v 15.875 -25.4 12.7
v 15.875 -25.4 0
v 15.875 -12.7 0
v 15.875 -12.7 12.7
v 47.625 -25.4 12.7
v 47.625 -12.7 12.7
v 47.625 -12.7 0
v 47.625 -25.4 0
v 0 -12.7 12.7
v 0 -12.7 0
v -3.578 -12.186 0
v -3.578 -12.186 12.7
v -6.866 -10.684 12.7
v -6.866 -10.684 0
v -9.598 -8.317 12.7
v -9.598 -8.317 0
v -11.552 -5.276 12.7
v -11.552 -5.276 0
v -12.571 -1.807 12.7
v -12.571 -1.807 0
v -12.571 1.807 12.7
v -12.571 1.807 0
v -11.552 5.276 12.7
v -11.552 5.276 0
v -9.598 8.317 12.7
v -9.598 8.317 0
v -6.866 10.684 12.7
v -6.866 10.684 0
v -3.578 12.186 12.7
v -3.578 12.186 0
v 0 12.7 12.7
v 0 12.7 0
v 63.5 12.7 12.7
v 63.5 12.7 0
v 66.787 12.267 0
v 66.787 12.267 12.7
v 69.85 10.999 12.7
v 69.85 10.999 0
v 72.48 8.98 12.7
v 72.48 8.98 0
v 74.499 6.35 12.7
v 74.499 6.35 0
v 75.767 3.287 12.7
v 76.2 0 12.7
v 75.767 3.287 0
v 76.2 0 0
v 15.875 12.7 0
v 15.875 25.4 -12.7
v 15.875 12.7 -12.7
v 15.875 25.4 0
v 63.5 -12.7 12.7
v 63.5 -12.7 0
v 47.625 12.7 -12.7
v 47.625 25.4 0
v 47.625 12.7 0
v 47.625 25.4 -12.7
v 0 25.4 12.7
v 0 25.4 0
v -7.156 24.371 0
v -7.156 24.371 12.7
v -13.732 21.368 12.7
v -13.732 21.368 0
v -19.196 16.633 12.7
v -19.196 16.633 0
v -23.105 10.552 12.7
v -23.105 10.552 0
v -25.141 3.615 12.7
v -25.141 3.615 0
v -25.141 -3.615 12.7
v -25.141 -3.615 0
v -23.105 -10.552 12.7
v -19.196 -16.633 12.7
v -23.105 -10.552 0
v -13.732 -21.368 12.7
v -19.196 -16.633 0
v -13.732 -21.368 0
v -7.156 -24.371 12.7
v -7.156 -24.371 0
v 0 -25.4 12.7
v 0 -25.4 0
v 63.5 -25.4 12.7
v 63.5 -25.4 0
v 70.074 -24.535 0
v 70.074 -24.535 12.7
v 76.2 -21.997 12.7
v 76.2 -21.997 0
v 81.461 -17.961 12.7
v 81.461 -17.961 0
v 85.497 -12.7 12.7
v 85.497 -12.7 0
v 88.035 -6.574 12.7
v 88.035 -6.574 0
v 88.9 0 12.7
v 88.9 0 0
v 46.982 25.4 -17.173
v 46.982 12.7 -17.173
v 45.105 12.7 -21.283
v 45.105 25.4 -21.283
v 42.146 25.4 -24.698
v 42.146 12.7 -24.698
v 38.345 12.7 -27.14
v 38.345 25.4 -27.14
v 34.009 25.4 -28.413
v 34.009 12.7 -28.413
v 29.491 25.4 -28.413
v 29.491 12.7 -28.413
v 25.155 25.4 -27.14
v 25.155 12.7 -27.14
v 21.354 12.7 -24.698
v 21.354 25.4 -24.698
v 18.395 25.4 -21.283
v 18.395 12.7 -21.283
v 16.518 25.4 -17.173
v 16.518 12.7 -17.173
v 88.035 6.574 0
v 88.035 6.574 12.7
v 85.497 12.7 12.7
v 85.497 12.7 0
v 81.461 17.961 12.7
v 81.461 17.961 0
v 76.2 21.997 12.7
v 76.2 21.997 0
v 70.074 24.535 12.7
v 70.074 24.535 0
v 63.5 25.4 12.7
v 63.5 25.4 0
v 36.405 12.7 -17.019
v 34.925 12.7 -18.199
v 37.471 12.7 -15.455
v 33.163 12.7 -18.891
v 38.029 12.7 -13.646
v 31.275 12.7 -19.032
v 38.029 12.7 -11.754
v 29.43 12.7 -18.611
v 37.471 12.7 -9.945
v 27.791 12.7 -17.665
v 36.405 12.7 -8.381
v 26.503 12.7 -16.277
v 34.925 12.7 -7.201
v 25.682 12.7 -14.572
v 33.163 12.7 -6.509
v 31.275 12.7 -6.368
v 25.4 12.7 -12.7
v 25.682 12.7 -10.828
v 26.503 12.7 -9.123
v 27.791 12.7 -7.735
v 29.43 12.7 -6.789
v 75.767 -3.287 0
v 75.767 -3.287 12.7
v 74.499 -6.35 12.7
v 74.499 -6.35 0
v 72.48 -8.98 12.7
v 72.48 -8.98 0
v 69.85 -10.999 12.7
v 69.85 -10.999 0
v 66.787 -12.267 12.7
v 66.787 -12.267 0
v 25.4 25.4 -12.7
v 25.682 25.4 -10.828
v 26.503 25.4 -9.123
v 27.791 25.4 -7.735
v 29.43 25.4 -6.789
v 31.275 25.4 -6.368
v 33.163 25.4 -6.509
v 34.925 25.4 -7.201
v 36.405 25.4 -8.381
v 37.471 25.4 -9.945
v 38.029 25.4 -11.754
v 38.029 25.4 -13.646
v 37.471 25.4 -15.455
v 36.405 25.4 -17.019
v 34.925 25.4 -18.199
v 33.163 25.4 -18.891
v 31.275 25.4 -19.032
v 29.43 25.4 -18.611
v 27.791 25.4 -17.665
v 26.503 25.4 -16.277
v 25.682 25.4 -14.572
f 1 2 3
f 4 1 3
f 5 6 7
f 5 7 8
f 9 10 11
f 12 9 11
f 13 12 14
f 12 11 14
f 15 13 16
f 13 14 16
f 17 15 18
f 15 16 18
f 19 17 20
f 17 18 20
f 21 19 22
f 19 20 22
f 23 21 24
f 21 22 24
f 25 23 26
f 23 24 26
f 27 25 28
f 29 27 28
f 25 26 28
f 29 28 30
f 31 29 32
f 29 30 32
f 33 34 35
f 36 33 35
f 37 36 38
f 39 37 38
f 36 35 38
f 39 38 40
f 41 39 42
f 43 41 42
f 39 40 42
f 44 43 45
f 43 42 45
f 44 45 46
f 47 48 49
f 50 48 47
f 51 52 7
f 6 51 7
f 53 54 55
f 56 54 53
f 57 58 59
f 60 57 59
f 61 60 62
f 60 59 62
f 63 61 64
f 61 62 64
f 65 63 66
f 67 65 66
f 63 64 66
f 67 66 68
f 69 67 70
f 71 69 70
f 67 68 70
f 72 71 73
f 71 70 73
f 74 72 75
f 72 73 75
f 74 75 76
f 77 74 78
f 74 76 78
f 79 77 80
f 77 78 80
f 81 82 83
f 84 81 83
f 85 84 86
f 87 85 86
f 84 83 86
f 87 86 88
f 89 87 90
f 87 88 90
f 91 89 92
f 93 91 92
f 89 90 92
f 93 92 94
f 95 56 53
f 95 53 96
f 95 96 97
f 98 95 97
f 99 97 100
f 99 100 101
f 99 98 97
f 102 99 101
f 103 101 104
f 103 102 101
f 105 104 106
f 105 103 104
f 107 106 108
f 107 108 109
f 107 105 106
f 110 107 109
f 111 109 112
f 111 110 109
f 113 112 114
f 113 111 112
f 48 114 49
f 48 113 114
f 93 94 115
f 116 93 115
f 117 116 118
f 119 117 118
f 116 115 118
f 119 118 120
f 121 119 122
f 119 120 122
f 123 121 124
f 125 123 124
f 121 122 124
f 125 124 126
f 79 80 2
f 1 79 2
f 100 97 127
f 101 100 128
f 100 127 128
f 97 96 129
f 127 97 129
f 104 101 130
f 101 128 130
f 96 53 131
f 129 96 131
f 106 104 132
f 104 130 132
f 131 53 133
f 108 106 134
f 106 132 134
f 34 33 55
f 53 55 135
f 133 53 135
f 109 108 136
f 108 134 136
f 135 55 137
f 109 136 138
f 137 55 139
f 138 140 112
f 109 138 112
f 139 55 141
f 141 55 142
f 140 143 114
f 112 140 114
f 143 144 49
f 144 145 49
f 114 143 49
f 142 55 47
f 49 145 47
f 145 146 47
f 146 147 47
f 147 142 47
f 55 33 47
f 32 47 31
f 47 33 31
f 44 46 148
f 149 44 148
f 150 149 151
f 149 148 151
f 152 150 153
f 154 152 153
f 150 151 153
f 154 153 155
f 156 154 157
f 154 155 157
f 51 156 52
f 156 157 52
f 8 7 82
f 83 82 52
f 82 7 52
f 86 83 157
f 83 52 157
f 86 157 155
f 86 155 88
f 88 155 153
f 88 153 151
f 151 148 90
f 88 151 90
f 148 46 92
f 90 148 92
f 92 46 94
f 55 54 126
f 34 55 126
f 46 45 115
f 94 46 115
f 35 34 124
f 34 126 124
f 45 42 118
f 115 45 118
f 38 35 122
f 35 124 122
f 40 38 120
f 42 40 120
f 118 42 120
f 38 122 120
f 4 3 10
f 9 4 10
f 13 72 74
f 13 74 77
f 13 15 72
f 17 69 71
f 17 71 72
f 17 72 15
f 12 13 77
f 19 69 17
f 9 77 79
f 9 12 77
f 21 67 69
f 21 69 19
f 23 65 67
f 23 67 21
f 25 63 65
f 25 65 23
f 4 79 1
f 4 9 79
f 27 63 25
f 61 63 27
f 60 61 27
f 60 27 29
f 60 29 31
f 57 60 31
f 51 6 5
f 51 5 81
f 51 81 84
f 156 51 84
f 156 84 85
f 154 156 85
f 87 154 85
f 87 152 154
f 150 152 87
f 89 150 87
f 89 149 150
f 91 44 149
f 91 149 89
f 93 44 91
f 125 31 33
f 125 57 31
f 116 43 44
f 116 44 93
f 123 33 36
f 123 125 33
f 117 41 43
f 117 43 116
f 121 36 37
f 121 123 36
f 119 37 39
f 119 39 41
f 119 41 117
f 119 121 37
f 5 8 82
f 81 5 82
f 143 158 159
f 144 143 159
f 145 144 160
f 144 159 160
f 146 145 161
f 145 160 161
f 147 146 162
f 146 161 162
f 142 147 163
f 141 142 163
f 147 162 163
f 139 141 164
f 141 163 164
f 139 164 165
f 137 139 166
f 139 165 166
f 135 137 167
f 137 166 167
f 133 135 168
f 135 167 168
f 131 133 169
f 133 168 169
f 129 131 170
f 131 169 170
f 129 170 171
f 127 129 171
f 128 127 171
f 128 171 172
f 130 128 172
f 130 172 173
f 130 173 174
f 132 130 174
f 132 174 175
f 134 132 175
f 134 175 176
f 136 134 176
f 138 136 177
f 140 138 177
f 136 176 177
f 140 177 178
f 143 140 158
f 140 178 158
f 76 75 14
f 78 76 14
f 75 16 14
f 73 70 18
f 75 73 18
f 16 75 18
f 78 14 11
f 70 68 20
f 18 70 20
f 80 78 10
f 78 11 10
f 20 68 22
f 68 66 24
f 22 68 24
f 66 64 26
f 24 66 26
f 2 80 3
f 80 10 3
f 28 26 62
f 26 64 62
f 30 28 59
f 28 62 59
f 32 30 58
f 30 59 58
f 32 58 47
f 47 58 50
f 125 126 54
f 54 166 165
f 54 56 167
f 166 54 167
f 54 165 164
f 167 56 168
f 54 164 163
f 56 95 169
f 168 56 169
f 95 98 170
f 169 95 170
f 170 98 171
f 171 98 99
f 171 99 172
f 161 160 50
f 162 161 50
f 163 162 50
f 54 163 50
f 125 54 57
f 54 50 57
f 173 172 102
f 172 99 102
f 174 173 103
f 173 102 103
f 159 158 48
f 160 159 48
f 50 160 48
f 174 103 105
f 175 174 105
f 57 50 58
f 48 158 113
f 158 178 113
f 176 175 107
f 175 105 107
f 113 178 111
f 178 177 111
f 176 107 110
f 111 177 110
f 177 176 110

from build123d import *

# Parameters (mm, degrees)
F1_DEPTH = 12.7
F2_R     = 6.35
F3_DEPTH = 12.7


with BuildPart() as f1:
    # F0 (on Top) → F1 (new body)
    with BuildSketch(Plane.XY):
        with BuildLine():
            ThreePointArc((21.997045, 12.7), (12.7, 21.997045), (0, 25.4))
            ThreePointArc((0, 25.4), (-25.4, 0), (0, -25.4))
            ThreePointArc((0, -25.4), (8.412257, -23.966517), (15.875, -19.827869))
            Line((15.875, -19.827869), (15.875, -12.7))
            Line((15.875, -12.7), (0, -12.7))
            ThreePointArc((0, -12.7), (-12.7, 0), (0, 12.7))
            Line((0, 12.7), (21.997045, 12.7))
        make_face()
        with BuildLine():
            Line((63.5, 25.4), (0, 25.4))
            ThreePointArc((0, 25.4), (12.7, 21.997045), (21.997045, 12.7))
            Line((21.997045, 12.7), (41.502955, 12.7))
            ThreePointArc((41.502955, 12.7), (50.8, 21.997045), (63.5, 25.4))
        make_face()
        with BuildLine():
            ThreePointArc((88.9, 0), (81.460512, 17.960512), (63.5, 25.4))
            ThreePointArc((63.5, 25.4), (50.8, 21.997045), (41.502955, 12.7))
            Line((41.502955, 12.7), (63.5, 12.7))
            ThreePointArc((63.5, 12.7), (72.480256, 8.980256), (76.2, 0))
            ThreePointArc((76.2, 0), (72.480256, -8.980256), (63.5, -12.7))
            Line((63.5, -12.7), (63.5, -25.4))
            ThreePointArc((63.5, -25.4), (81.460512, -17.960512), (88.9, 0))
        make_face()
        with BuildLine():
            ThreePointArc((63.5, -25.4), (55.087743, -23.966517), (47.625, -19.827869))
            Line((47.625, -19.827869), (47.625, -25.4))
            Line((47.625, -25.4), (63.5, -25.4))
        make_face()
        with BuildLine():
            ThreePointArc((15.875, -19.827869), (8.412257, -23.966517), (0, -25.4))
            Line((0, -25.4), (15.875, -25.4))
            Line((15.875, -25.4), (15.875, -19.827869))
        make_face()
        with BuildLine():
            Line((47.625, -12.7), (47.625, -19.827869))
            ThreePointArc((47.625, -19.827869), (55.087743, -23.966517), (63.5, -25.4))
            Line((63.5, -25.4), (63.5, -12.7))
            Line((63.5, -12.7), (47.625, -12.7))
        make_face()
    extrude(amount=F1_DEPTH)

    # F2 (on face) → F3 (join, through all)
    with BuildSketch(Plane(origin=(0, 25.4, 0), x_dir=(-1, 0, 0), z_dir=(0, 1, 0))):
        with BuildLine():
            ThreePointArc((-47.625, -12.7), (-31.75, -28.575), (-15.875, -12.7))
            ThreePointArc((-15.875, -12.7), (-31.75, 3.175), (-47.625, -12.7))
        make_face()
        with Locations((-31.75, -12.7)):
            Circle(F2_R, mode=Mode.SUBTRACT)
        with BuildLine():
            ThreePointArc((-22.225, 0), (-17.550968, -5.600484), (-15.875, -12.7))
            Line((-15.875, -12.7), (-15.875, 0))
            Line((-15.875, 0), (-22.225, 0))
        make_face()
        with BuildLine():
            Line((-47.625, 0), (-47.625, -12.7))
            ThreePointArc((-47.625, -12.7), (-45.949032, -5.600484), (-41.275, 0))
            Line((-41.275, 0), (-47.625, 0))
        make_face()
    extrude(amount=-F3_DEPTH)


solid = f1.part
